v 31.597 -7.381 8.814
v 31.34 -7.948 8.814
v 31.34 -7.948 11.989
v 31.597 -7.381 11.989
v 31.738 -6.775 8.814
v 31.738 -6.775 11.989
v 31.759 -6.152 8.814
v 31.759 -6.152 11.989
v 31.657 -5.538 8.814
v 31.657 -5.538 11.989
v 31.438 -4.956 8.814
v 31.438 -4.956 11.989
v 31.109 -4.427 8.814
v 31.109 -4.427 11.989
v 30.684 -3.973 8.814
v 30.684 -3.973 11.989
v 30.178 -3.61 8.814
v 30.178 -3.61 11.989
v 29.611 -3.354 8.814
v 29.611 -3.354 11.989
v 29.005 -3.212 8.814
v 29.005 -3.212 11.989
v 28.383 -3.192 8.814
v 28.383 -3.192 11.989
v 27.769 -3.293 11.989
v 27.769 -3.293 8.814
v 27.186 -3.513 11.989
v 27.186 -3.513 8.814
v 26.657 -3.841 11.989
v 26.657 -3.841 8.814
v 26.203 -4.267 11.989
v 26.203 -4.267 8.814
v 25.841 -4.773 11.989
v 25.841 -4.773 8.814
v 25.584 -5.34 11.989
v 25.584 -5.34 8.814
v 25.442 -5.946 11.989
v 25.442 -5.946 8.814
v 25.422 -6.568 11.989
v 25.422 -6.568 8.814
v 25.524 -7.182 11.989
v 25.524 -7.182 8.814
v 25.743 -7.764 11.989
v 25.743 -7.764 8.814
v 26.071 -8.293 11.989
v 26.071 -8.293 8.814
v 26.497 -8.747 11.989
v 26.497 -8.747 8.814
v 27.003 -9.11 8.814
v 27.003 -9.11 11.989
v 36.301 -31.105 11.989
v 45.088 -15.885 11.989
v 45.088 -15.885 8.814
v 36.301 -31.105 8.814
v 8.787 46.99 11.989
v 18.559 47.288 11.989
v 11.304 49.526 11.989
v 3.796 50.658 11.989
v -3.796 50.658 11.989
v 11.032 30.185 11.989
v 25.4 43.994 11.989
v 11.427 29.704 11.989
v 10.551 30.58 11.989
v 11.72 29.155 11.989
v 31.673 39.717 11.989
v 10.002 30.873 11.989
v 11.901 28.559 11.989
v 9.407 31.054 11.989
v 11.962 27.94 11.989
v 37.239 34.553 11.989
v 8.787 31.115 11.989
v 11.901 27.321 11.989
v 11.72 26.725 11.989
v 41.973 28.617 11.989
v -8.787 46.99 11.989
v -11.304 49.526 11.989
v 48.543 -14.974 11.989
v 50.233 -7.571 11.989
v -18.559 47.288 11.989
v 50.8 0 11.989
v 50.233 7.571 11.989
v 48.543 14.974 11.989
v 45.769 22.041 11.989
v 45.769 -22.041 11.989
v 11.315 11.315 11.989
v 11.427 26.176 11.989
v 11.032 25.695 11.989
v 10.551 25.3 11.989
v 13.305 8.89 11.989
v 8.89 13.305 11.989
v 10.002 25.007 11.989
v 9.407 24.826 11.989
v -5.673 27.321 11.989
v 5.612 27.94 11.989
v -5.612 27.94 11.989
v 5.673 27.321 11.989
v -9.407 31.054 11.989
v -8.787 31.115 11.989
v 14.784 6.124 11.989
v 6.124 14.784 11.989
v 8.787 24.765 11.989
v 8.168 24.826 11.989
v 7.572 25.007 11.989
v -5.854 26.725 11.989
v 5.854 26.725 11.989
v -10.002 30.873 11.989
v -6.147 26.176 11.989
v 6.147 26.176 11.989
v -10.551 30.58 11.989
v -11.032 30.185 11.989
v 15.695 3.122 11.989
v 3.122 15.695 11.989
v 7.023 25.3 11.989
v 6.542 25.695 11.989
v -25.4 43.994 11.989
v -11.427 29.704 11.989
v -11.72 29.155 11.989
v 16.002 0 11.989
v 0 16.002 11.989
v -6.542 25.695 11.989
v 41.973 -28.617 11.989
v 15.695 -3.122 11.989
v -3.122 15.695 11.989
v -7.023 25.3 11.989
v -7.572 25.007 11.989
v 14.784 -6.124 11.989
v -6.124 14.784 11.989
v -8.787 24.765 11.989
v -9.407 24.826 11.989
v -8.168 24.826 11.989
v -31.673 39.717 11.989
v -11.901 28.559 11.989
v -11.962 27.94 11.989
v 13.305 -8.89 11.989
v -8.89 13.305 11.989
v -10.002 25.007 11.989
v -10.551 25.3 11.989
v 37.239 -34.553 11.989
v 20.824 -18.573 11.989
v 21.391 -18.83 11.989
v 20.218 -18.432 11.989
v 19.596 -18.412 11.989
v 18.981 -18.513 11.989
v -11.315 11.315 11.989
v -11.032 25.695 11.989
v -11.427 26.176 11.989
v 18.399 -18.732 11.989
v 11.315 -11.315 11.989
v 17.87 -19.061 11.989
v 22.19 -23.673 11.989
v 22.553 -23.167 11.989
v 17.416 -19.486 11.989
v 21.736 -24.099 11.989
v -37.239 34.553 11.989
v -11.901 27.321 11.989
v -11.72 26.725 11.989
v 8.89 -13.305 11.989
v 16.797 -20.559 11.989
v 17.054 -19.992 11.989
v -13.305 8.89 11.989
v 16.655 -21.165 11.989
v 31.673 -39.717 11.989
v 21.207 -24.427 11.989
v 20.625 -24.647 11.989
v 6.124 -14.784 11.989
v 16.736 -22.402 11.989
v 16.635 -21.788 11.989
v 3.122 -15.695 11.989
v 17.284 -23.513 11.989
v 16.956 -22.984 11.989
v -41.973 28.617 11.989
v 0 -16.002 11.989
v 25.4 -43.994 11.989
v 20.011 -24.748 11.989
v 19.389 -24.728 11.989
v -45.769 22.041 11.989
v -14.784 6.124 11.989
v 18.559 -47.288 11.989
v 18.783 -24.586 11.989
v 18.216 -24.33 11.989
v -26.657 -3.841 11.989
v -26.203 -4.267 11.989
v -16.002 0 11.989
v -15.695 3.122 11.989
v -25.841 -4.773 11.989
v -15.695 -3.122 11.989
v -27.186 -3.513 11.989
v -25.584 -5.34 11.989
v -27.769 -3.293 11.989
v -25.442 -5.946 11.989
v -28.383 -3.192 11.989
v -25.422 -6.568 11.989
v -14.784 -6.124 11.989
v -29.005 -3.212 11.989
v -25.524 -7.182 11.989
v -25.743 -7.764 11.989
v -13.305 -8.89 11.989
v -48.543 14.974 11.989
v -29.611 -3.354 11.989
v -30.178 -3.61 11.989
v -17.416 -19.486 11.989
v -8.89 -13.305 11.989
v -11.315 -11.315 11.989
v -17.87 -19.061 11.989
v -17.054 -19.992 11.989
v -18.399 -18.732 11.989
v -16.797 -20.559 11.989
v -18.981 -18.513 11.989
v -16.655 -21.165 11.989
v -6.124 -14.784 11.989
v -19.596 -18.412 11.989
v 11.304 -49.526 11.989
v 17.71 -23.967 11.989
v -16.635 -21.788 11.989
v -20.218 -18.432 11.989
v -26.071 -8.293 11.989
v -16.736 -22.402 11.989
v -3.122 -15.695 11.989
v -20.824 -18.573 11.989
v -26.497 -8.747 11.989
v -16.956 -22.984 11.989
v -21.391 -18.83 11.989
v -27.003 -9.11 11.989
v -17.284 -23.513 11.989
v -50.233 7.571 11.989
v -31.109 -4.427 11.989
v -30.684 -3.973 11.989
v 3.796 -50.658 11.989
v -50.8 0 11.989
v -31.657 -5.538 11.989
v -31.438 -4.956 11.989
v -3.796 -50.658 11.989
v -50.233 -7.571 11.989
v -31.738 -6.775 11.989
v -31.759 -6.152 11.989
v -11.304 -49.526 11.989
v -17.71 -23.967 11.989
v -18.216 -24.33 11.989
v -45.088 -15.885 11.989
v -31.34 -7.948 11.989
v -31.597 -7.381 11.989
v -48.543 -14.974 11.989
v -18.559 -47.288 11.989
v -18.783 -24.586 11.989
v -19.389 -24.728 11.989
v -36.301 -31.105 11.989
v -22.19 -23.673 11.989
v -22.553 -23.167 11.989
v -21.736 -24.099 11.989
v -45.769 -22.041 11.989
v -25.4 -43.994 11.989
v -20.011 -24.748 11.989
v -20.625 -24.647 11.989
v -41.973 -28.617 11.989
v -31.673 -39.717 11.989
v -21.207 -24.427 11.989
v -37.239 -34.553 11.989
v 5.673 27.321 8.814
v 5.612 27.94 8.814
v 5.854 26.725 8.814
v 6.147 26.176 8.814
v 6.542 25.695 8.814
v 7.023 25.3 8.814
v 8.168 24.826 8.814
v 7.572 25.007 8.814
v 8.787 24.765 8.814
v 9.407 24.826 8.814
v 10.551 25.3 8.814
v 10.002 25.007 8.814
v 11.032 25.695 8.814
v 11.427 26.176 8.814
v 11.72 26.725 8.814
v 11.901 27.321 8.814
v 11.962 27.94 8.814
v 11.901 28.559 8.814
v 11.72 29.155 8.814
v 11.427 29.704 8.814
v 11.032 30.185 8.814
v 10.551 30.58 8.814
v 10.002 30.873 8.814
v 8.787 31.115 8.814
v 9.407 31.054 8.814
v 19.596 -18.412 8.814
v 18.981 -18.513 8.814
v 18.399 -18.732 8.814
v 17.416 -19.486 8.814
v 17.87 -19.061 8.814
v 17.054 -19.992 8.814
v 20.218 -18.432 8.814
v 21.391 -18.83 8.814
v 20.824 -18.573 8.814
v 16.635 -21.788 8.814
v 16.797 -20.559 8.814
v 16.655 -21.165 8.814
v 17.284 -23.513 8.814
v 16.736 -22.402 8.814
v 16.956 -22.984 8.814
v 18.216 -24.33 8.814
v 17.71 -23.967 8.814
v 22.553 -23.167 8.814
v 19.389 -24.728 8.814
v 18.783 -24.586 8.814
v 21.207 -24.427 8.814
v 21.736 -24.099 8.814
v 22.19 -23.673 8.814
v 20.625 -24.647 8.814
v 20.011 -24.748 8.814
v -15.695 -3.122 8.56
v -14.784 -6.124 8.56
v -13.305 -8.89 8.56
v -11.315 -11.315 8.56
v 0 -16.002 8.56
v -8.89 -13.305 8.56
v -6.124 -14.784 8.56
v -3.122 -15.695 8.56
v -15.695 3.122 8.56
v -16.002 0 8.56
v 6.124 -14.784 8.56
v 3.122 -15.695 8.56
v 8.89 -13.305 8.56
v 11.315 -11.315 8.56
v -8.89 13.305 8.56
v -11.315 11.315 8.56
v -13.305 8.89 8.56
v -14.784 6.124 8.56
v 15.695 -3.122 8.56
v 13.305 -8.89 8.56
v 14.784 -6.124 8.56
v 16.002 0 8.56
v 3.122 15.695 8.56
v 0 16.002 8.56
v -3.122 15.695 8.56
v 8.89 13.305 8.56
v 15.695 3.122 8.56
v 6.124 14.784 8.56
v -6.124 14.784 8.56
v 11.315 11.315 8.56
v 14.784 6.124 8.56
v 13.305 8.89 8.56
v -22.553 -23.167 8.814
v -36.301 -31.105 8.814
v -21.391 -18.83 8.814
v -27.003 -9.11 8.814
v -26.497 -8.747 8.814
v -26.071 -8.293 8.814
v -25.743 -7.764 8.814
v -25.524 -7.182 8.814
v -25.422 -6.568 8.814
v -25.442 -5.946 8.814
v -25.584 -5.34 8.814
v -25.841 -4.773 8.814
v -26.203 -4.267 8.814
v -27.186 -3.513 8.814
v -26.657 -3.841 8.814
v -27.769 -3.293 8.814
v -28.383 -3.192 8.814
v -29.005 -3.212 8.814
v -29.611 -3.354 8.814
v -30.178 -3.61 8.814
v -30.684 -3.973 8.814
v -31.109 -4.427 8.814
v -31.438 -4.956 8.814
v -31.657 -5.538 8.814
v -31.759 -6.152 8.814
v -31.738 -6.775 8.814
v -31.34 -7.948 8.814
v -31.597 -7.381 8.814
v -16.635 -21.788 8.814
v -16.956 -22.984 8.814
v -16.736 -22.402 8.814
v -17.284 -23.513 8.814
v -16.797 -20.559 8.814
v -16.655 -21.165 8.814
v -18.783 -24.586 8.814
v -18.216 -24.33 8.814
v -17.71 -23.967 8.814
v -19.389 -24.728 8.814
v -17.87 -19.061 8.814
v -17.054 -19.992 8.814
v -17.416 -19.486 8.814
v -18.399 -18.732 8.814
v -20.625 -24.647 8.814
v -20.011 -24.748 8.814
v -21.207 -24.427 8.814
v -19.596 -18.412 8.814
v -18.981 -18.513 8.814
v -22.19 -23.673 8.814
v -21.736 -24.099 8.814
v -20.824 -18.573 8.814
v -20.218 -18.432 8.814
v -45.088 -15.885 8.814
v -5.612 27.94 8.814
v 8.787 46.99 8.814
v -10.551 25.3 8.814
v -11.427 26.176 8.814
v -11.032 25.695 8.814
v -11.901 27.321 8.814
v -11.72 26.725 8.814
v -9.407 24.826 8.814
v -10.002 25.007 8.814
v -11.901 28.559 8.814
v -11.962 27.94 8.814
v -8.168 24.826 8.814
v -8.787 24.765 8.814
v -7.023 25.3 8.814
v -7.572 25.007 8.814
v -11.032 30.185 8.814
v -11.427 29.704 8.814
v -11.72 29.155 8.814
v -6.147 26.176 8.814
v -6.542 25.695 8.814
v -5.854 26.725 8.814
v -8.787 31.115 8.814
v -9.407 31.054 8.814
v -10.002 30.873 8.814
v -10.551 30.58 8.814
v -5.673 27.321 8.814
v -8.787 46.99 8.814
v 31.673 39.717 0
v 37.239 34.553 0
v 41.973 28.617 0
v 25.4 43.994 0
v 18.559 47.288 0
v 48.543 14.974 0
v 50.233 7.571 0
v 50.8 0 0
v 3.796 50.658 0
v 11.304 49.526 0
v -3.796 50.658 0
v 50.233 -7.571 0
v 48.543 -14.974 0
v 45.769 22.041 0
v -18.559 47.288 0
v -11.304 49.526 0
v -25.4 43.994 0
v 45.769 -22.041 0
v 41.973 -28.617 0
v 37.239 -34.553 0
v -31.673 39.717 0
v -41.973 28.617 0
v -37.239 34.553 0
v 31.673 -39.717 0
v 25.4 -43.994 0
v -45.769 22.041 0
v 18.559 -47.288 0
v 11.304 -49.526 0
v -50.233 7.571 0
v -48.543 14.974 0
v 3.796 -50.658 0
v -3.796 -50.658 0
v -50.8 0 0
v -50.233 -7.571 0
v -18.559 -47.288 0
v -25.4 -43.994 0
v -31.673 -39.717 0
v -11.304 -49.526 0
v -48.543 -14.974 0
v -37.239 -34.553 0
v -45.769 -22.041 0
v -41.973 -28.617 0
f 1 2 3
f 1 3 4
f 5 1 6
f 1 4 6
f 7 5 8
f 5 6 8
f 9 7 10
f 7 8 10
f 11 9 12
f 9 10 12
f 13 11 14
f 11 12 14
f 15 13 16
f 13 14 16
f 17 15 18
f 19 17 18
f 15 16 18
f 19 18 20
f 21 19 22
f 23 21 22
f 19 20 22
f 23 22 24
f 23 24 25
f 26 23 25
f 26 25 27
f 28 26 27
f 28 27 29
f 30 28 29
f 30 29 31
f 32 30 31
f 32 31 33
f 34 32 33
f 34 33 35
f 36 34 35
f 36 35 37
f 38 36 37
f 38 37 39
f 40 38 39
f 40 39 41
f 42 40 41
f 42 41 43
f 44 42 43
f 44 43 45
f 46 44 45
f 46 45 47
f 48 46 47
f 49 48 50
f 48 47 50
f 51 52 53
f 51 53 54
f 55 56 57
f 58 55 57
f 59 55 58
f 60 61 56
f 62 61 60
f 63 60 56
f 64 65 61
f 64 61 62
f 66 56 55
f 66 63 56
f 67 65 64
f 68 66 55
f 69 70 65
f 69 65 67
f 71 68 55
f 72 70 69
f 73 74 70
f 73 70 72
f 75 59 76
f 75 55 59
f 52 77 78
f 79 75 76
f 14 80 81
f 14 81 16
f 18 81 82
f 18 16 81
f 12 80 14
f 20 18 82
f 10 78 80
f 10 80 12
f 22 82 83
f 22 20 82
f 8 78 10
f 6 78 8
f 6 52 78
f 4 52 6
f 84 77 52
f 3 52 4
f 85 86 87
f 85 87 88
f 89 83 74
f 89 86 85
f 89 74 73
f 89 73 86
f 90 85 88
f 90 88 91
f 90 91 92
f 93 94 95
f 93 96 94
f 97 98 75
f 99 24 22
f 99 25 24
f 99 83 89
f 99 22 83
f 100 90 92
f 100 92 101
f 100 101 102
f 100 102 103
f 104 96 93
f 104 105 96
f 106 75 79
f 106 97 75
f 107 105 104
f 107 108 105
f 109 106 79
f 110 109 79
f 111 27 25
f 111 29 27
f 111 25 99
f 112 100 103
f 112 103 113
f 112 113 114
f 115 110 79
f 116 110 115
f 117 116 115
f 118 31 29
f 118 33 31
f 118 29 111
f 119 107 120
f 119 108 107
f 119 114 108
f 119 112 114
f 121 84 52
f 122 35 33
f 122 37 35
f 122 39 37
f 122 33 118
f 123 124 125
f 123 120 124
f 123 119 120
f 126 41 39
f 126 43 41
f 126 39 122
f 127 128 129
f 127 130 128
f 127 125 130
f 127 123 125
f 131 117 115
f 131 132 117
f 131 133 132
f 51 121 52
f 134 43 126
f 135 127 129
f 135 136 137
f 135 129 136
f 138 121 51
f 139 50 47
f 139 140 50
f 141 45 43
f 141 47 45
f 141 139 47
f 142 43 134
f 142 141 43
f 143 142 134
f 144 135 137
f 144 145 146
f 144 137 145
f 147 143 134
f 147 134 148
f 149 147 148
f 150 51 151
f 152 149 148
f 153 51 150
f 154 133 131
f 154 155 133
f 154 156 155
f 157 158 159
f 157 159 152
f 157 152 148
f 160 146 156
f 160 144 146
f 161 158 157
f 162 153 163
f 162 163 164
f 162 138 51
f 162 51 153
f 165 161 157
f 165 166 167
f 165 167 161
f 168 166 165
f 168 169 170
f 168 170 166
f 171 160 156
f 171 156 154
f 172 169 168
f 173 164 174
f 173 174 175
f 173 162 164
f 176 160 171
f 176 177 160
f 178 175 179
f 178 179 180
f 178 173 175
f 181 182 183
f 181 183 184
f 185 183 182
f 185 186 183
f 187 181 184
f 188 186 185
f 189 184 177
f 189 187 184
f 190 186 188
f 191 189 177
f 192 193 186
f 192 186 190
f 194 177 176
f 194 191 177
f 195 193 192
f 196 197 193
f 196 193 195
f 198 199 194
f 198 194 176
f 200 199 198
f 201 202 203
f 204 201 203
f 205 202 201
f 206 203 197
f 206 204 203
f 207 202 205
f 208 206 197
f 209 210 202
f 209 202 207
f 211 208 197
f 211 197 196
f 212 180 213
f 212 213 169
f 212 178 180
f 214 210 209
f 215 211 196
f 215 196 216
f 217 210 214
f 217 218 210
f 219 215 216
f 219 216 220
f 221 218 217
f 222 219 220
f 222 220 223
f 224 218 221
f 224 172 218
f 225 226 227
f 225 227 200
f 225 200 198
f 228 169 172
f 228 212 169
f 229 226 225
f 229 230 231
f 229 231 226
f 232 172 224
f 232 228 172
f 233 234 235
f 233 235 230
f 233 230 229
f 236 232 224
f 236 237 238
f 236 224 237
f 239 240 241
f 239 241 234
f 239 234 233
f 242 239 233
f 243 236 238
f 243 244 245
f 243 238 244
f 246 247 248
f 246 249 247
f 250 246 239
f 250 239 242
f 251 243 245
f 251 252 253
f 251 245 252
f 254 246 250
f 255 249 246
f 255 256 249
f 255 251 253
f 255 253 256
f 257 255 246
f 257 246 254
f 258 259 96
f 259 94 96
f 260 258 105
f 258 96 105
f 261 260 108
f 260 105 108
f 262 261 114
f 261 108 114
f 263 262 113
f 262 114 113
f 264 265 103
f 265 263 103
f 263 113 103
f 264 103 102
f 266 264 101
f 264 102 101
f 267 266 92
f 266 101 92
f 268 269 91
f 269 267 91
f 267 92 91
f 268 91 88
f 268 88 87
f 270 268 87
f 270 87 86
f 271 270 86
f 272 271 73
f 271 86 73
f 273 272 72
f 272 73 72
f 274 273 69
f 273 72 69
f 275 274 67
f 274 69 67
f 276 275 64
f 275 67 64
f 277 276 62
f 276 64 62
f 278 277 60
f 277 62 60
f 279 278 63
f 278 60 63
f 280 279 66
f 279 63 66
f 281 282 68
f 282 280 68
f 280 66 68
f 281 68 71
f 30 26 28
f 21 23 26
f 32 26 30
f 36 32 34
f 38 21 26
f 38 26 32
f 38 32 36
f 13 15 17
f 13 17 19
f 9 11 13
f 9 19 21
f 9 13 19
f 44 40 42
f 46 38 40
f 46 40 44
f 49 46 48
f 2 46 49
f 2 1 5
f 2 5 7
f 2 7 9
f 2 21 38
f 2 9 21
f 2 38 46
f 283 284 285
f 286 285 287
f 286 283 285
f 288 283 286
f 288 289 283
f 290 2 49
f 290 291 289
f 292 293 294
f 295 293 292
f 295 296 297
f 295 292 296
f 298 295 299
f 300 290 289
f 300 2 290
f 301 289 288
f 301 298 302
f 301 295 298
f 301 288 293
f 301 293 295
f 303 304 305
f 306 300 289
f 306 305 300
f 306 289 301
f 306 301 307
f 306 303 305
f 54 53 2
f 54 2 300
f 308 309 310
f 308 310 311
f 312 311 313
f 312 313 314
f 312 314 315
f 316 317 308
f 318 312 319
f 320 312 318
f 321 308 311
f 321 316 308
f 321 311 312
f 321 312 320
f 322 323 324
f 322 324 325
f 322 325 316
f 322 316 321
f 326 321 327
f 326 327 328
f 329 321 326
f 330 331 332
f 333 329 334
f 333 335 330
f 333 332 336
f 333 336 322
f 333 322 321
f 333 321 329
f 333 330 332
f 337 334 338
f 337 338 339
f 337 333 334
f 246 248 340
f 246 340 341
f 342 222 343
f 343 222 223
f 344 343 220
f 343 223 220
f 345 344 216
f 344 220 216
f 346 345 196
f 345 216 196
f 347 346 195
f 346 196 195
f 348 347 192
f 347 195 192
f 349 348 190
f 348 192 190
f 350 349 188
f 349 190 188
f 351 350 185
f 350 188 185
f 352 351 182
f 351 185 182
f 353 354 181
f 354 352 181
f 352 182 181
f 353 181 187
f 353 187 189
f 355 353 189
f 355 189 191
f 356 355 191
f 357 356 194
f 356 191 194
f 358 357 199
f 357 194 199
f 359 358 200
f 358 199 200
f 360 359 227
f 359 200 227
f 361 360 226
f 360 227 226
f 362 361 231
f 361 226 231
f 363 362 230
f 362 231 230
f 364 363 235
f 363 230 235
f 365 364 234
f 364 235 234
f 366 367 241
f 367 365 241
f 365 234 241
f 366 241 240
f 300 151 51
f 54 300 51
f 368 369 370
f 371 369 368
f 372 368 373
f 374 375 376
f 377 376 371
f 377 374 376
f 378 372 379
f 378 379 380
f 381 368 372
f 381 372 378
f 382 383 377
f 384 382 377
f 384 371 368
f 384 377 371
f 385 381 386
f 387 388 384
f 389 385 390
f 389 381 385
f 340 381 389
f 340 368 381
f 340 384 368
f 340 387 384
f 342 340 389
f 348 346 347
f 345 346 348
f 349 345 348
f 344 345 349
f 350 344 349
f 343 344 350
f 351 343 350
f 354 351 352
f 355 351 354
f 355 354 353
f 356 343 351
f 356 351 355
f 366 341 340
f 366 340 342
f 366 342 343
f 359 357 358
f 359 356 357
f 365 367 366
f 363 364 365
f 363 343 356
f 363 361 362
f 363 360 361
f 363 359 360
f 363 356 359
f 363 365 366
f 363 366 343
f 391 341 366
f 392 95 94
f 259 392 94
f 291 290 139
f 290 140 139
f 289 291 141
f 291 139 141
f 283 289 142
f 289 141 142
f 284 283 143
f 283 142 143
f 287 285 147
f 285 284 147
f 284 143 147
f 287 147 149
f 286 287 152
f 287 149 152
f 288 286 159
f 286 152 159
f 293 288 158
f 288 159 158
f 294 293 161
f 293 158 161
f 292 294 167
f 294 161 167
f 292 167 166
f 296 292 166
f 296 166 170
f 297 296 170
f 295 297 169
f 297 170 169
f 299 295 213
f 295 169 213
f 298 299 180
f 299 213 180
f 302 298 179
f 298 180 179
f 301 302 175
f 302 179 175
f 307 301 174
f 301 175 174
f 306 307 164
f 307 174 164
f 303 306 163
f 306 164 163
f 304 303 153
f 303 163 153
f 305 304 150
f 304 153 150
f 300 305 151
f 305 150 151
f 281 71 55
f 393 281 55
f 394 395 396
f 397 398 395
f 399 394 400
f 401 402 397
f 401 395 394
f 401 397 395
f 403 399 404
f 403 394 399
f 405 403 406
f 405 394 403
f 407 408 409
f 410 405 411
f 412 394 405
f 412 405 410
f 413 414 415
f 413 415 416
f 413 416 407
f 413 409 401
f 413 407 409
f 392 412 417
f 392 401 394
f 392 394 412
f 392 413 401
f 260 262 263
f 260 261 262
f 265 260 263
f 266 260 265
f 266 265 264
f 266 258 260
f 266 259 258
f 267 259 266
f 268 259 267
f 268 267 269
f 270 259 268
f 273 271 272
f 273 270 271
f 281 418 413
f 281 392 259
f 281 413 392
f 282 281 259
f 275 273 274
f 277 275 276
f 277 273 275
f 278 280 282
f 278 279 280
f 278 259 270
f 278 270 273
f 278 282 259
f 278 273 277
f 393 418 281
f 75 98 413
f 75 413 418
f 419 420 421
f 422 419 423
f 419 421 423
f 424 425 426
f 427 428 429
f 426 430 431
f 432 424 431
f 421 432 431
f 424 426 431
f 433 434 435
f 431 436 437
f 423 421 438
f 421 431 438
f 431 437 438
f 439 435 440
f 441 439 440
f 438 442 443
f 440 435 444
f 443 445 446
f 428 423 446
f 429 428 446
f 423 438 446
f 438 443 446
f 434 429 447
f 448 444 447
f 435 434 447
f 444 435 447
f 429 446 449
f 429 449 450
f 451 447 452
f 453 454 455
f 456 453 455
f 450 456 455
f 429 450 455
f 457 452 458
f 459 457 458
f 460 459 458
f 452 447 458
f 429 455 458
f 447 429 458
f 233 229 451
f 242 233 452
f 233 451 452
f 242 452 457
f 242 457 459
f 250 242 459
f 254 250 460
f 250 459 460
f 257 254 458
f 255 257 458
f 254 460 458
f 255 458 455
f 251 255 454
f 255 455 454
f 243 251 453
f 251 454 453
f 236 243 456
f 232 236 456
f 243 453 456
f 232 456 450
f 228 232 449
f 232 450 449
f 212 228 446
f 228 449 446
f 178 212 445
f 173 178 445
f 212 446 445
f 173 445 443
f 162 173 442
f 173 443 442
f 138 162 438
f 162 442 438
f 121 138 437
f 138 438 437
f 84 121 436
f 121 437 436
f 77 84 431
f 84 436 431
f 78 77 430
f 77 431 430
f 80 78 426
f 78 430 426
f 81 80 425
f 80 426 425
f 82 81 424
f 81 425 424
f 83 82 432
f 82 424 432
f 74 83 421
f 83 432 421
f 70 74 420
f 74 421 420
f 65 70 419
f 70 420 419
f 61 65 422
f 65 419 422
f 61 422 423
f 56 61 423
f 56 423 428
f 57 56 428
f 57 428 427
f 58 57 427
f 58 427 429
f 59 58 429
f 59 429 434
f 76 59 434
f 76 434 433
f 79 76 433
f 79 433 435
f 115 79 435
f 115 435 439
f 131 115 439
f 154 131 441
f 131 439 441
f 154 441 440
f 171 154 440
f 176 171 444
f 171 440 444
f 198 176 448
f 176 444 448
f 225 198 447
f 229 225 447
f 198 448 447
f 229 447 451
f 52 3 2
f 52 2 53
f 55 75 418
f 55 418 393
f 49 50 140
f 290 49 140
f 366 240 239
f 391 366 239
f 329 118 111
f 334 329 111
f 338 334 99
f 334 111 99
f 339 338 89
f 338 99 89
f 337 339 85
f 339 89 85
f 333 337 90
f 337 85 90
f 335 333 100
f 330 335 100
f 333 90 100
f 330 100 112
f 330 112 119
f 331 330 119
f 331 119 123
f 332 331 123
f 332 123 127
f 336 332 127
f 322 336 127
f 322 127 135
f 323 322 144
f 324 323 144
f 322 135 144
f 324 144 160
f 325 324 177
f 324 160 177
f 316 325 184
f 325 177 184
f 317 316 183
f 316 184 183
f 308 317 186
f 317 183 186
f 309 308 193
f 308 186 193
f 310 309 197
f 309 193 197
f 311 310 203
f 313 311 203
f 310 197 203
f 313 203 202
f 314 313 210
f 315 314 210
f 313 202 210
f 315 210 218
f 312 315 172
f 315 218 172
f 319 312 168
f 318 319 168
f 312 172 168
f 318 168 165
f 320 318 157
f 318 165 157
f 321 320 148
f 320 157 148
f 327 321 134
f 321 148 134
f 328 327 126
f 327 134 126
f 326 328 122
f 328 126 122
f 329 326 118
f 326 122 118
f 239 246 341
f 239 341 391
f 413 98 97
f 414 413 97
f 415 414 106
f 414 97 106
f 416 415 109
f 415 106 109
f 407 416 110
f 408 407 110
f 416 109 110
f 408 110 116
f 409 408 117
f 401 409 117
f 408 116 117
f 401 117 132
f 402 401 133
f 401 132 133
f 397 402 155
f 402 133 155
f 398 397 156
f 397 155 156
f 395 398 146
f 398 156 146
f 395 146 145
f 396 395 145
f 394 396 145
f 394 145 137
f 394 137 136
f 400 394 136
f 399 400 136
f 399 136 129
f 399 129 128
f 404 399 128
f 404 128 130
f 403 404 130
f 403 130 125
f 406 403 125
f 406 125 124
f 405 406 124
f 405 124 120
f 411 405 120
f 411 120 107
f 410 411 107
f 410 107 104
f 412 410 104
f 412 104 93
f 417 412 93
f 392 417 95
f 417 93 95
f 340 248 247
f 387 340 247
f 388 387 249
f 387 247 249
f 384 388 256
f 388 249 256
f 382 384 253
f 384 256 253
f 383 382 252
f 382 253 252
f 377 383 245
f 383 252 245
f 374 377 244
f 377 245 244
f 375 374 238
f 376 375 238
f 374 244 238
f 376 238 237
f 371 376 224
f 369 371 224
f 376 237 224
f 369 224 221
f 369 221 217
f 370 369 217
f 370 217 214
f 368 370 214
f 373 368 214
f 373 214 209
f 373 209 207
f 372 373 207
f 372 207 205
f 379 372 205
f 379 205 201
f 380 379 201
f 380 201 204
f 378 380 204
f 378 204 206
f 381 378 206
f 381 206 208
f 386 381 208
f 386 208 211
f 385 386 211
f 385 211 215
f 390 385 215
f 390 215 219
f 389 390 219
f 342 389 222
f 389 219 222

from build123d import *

# Parameters (mm, degrees)
SKETCH1_R           = 50.8
BOSS_EXTRUDE1_DEPTH = 11.9888
SKETCH3_W           = 17.57426
SKETCH3_H           = 19.05
POCKET_DEPTH        = 3.175
SKETCH7_R           = 3.175
CORNER_RELIEF_DEPTH = 3.175
CIRPATTERN1_COUNT   = 3
SKETCH5_R           = 16.002
MAGNET_INSET_DEPTH  = 3.429


with BuildPart() as part:
    # Sketch1 → Boss-Extrude1 (new body)
    with BuildSketch(Plane.XY):
        with Locations(Location((0, 0, 0), (0, 0, 180))):
            Circle(SKETCH1_R)
    extrude(amount=BOSS_EXTRUDE1_DEPTH)

    # Sketch3 → pocket (cut)
    with BuildSketch(Plane.XY.offset(11.9888)):
        with Locations((0, 37.465)):
            Rectangle(SKETCH3_W, SKETCH3_H)
    pocket = extrude(amount=-POCKET_DEPTH, mode=Mode.SUBTRACT)

    # Sketch7 → corner relief (cut)
    with BuildSketch(Plane.XY.offset(11.9888)):
        with Locations((-8.78713, 27.94)):
            Circle(SKETCH7_R)
        with Locations((8.78713, 27.94)):
            Circle(SKETCH7_R)
    corner_relief = extrude(amount=-CORNER_RELIEF_DEPTH, mode=Mode.SUBTRACT)

    # CirPattern1: pocket, corner relief ×3 about axis
    cirpattern1_axis = Axis((0, 0, 0), (0, 0, 1))
    add([pocket.rotate(cirpattern1_axis, i * 360 / CIRPATTERN1_COUNT) for i in range(1, CIRPATTERN1_COUNT)], mode=Mode.SUBTRACT)
    add([corner_relief.rotate(cirpattern1_axis, i * 360 / CIRPATTERN1_COUNT) for i in range(1, CIRPATTERN1_COUNT)], mode=Mode.SUBTRACT)

    # Sketch5 → magnet inset (cut)
    with BuildSketch(Plane.XY.offset(11.9888)):
        Circle(SKETCH5_R)
    extrude(amount=-MAGNET_INSET_DEPTH, mode=Mode.SUBTRACT)


solid = part.part
